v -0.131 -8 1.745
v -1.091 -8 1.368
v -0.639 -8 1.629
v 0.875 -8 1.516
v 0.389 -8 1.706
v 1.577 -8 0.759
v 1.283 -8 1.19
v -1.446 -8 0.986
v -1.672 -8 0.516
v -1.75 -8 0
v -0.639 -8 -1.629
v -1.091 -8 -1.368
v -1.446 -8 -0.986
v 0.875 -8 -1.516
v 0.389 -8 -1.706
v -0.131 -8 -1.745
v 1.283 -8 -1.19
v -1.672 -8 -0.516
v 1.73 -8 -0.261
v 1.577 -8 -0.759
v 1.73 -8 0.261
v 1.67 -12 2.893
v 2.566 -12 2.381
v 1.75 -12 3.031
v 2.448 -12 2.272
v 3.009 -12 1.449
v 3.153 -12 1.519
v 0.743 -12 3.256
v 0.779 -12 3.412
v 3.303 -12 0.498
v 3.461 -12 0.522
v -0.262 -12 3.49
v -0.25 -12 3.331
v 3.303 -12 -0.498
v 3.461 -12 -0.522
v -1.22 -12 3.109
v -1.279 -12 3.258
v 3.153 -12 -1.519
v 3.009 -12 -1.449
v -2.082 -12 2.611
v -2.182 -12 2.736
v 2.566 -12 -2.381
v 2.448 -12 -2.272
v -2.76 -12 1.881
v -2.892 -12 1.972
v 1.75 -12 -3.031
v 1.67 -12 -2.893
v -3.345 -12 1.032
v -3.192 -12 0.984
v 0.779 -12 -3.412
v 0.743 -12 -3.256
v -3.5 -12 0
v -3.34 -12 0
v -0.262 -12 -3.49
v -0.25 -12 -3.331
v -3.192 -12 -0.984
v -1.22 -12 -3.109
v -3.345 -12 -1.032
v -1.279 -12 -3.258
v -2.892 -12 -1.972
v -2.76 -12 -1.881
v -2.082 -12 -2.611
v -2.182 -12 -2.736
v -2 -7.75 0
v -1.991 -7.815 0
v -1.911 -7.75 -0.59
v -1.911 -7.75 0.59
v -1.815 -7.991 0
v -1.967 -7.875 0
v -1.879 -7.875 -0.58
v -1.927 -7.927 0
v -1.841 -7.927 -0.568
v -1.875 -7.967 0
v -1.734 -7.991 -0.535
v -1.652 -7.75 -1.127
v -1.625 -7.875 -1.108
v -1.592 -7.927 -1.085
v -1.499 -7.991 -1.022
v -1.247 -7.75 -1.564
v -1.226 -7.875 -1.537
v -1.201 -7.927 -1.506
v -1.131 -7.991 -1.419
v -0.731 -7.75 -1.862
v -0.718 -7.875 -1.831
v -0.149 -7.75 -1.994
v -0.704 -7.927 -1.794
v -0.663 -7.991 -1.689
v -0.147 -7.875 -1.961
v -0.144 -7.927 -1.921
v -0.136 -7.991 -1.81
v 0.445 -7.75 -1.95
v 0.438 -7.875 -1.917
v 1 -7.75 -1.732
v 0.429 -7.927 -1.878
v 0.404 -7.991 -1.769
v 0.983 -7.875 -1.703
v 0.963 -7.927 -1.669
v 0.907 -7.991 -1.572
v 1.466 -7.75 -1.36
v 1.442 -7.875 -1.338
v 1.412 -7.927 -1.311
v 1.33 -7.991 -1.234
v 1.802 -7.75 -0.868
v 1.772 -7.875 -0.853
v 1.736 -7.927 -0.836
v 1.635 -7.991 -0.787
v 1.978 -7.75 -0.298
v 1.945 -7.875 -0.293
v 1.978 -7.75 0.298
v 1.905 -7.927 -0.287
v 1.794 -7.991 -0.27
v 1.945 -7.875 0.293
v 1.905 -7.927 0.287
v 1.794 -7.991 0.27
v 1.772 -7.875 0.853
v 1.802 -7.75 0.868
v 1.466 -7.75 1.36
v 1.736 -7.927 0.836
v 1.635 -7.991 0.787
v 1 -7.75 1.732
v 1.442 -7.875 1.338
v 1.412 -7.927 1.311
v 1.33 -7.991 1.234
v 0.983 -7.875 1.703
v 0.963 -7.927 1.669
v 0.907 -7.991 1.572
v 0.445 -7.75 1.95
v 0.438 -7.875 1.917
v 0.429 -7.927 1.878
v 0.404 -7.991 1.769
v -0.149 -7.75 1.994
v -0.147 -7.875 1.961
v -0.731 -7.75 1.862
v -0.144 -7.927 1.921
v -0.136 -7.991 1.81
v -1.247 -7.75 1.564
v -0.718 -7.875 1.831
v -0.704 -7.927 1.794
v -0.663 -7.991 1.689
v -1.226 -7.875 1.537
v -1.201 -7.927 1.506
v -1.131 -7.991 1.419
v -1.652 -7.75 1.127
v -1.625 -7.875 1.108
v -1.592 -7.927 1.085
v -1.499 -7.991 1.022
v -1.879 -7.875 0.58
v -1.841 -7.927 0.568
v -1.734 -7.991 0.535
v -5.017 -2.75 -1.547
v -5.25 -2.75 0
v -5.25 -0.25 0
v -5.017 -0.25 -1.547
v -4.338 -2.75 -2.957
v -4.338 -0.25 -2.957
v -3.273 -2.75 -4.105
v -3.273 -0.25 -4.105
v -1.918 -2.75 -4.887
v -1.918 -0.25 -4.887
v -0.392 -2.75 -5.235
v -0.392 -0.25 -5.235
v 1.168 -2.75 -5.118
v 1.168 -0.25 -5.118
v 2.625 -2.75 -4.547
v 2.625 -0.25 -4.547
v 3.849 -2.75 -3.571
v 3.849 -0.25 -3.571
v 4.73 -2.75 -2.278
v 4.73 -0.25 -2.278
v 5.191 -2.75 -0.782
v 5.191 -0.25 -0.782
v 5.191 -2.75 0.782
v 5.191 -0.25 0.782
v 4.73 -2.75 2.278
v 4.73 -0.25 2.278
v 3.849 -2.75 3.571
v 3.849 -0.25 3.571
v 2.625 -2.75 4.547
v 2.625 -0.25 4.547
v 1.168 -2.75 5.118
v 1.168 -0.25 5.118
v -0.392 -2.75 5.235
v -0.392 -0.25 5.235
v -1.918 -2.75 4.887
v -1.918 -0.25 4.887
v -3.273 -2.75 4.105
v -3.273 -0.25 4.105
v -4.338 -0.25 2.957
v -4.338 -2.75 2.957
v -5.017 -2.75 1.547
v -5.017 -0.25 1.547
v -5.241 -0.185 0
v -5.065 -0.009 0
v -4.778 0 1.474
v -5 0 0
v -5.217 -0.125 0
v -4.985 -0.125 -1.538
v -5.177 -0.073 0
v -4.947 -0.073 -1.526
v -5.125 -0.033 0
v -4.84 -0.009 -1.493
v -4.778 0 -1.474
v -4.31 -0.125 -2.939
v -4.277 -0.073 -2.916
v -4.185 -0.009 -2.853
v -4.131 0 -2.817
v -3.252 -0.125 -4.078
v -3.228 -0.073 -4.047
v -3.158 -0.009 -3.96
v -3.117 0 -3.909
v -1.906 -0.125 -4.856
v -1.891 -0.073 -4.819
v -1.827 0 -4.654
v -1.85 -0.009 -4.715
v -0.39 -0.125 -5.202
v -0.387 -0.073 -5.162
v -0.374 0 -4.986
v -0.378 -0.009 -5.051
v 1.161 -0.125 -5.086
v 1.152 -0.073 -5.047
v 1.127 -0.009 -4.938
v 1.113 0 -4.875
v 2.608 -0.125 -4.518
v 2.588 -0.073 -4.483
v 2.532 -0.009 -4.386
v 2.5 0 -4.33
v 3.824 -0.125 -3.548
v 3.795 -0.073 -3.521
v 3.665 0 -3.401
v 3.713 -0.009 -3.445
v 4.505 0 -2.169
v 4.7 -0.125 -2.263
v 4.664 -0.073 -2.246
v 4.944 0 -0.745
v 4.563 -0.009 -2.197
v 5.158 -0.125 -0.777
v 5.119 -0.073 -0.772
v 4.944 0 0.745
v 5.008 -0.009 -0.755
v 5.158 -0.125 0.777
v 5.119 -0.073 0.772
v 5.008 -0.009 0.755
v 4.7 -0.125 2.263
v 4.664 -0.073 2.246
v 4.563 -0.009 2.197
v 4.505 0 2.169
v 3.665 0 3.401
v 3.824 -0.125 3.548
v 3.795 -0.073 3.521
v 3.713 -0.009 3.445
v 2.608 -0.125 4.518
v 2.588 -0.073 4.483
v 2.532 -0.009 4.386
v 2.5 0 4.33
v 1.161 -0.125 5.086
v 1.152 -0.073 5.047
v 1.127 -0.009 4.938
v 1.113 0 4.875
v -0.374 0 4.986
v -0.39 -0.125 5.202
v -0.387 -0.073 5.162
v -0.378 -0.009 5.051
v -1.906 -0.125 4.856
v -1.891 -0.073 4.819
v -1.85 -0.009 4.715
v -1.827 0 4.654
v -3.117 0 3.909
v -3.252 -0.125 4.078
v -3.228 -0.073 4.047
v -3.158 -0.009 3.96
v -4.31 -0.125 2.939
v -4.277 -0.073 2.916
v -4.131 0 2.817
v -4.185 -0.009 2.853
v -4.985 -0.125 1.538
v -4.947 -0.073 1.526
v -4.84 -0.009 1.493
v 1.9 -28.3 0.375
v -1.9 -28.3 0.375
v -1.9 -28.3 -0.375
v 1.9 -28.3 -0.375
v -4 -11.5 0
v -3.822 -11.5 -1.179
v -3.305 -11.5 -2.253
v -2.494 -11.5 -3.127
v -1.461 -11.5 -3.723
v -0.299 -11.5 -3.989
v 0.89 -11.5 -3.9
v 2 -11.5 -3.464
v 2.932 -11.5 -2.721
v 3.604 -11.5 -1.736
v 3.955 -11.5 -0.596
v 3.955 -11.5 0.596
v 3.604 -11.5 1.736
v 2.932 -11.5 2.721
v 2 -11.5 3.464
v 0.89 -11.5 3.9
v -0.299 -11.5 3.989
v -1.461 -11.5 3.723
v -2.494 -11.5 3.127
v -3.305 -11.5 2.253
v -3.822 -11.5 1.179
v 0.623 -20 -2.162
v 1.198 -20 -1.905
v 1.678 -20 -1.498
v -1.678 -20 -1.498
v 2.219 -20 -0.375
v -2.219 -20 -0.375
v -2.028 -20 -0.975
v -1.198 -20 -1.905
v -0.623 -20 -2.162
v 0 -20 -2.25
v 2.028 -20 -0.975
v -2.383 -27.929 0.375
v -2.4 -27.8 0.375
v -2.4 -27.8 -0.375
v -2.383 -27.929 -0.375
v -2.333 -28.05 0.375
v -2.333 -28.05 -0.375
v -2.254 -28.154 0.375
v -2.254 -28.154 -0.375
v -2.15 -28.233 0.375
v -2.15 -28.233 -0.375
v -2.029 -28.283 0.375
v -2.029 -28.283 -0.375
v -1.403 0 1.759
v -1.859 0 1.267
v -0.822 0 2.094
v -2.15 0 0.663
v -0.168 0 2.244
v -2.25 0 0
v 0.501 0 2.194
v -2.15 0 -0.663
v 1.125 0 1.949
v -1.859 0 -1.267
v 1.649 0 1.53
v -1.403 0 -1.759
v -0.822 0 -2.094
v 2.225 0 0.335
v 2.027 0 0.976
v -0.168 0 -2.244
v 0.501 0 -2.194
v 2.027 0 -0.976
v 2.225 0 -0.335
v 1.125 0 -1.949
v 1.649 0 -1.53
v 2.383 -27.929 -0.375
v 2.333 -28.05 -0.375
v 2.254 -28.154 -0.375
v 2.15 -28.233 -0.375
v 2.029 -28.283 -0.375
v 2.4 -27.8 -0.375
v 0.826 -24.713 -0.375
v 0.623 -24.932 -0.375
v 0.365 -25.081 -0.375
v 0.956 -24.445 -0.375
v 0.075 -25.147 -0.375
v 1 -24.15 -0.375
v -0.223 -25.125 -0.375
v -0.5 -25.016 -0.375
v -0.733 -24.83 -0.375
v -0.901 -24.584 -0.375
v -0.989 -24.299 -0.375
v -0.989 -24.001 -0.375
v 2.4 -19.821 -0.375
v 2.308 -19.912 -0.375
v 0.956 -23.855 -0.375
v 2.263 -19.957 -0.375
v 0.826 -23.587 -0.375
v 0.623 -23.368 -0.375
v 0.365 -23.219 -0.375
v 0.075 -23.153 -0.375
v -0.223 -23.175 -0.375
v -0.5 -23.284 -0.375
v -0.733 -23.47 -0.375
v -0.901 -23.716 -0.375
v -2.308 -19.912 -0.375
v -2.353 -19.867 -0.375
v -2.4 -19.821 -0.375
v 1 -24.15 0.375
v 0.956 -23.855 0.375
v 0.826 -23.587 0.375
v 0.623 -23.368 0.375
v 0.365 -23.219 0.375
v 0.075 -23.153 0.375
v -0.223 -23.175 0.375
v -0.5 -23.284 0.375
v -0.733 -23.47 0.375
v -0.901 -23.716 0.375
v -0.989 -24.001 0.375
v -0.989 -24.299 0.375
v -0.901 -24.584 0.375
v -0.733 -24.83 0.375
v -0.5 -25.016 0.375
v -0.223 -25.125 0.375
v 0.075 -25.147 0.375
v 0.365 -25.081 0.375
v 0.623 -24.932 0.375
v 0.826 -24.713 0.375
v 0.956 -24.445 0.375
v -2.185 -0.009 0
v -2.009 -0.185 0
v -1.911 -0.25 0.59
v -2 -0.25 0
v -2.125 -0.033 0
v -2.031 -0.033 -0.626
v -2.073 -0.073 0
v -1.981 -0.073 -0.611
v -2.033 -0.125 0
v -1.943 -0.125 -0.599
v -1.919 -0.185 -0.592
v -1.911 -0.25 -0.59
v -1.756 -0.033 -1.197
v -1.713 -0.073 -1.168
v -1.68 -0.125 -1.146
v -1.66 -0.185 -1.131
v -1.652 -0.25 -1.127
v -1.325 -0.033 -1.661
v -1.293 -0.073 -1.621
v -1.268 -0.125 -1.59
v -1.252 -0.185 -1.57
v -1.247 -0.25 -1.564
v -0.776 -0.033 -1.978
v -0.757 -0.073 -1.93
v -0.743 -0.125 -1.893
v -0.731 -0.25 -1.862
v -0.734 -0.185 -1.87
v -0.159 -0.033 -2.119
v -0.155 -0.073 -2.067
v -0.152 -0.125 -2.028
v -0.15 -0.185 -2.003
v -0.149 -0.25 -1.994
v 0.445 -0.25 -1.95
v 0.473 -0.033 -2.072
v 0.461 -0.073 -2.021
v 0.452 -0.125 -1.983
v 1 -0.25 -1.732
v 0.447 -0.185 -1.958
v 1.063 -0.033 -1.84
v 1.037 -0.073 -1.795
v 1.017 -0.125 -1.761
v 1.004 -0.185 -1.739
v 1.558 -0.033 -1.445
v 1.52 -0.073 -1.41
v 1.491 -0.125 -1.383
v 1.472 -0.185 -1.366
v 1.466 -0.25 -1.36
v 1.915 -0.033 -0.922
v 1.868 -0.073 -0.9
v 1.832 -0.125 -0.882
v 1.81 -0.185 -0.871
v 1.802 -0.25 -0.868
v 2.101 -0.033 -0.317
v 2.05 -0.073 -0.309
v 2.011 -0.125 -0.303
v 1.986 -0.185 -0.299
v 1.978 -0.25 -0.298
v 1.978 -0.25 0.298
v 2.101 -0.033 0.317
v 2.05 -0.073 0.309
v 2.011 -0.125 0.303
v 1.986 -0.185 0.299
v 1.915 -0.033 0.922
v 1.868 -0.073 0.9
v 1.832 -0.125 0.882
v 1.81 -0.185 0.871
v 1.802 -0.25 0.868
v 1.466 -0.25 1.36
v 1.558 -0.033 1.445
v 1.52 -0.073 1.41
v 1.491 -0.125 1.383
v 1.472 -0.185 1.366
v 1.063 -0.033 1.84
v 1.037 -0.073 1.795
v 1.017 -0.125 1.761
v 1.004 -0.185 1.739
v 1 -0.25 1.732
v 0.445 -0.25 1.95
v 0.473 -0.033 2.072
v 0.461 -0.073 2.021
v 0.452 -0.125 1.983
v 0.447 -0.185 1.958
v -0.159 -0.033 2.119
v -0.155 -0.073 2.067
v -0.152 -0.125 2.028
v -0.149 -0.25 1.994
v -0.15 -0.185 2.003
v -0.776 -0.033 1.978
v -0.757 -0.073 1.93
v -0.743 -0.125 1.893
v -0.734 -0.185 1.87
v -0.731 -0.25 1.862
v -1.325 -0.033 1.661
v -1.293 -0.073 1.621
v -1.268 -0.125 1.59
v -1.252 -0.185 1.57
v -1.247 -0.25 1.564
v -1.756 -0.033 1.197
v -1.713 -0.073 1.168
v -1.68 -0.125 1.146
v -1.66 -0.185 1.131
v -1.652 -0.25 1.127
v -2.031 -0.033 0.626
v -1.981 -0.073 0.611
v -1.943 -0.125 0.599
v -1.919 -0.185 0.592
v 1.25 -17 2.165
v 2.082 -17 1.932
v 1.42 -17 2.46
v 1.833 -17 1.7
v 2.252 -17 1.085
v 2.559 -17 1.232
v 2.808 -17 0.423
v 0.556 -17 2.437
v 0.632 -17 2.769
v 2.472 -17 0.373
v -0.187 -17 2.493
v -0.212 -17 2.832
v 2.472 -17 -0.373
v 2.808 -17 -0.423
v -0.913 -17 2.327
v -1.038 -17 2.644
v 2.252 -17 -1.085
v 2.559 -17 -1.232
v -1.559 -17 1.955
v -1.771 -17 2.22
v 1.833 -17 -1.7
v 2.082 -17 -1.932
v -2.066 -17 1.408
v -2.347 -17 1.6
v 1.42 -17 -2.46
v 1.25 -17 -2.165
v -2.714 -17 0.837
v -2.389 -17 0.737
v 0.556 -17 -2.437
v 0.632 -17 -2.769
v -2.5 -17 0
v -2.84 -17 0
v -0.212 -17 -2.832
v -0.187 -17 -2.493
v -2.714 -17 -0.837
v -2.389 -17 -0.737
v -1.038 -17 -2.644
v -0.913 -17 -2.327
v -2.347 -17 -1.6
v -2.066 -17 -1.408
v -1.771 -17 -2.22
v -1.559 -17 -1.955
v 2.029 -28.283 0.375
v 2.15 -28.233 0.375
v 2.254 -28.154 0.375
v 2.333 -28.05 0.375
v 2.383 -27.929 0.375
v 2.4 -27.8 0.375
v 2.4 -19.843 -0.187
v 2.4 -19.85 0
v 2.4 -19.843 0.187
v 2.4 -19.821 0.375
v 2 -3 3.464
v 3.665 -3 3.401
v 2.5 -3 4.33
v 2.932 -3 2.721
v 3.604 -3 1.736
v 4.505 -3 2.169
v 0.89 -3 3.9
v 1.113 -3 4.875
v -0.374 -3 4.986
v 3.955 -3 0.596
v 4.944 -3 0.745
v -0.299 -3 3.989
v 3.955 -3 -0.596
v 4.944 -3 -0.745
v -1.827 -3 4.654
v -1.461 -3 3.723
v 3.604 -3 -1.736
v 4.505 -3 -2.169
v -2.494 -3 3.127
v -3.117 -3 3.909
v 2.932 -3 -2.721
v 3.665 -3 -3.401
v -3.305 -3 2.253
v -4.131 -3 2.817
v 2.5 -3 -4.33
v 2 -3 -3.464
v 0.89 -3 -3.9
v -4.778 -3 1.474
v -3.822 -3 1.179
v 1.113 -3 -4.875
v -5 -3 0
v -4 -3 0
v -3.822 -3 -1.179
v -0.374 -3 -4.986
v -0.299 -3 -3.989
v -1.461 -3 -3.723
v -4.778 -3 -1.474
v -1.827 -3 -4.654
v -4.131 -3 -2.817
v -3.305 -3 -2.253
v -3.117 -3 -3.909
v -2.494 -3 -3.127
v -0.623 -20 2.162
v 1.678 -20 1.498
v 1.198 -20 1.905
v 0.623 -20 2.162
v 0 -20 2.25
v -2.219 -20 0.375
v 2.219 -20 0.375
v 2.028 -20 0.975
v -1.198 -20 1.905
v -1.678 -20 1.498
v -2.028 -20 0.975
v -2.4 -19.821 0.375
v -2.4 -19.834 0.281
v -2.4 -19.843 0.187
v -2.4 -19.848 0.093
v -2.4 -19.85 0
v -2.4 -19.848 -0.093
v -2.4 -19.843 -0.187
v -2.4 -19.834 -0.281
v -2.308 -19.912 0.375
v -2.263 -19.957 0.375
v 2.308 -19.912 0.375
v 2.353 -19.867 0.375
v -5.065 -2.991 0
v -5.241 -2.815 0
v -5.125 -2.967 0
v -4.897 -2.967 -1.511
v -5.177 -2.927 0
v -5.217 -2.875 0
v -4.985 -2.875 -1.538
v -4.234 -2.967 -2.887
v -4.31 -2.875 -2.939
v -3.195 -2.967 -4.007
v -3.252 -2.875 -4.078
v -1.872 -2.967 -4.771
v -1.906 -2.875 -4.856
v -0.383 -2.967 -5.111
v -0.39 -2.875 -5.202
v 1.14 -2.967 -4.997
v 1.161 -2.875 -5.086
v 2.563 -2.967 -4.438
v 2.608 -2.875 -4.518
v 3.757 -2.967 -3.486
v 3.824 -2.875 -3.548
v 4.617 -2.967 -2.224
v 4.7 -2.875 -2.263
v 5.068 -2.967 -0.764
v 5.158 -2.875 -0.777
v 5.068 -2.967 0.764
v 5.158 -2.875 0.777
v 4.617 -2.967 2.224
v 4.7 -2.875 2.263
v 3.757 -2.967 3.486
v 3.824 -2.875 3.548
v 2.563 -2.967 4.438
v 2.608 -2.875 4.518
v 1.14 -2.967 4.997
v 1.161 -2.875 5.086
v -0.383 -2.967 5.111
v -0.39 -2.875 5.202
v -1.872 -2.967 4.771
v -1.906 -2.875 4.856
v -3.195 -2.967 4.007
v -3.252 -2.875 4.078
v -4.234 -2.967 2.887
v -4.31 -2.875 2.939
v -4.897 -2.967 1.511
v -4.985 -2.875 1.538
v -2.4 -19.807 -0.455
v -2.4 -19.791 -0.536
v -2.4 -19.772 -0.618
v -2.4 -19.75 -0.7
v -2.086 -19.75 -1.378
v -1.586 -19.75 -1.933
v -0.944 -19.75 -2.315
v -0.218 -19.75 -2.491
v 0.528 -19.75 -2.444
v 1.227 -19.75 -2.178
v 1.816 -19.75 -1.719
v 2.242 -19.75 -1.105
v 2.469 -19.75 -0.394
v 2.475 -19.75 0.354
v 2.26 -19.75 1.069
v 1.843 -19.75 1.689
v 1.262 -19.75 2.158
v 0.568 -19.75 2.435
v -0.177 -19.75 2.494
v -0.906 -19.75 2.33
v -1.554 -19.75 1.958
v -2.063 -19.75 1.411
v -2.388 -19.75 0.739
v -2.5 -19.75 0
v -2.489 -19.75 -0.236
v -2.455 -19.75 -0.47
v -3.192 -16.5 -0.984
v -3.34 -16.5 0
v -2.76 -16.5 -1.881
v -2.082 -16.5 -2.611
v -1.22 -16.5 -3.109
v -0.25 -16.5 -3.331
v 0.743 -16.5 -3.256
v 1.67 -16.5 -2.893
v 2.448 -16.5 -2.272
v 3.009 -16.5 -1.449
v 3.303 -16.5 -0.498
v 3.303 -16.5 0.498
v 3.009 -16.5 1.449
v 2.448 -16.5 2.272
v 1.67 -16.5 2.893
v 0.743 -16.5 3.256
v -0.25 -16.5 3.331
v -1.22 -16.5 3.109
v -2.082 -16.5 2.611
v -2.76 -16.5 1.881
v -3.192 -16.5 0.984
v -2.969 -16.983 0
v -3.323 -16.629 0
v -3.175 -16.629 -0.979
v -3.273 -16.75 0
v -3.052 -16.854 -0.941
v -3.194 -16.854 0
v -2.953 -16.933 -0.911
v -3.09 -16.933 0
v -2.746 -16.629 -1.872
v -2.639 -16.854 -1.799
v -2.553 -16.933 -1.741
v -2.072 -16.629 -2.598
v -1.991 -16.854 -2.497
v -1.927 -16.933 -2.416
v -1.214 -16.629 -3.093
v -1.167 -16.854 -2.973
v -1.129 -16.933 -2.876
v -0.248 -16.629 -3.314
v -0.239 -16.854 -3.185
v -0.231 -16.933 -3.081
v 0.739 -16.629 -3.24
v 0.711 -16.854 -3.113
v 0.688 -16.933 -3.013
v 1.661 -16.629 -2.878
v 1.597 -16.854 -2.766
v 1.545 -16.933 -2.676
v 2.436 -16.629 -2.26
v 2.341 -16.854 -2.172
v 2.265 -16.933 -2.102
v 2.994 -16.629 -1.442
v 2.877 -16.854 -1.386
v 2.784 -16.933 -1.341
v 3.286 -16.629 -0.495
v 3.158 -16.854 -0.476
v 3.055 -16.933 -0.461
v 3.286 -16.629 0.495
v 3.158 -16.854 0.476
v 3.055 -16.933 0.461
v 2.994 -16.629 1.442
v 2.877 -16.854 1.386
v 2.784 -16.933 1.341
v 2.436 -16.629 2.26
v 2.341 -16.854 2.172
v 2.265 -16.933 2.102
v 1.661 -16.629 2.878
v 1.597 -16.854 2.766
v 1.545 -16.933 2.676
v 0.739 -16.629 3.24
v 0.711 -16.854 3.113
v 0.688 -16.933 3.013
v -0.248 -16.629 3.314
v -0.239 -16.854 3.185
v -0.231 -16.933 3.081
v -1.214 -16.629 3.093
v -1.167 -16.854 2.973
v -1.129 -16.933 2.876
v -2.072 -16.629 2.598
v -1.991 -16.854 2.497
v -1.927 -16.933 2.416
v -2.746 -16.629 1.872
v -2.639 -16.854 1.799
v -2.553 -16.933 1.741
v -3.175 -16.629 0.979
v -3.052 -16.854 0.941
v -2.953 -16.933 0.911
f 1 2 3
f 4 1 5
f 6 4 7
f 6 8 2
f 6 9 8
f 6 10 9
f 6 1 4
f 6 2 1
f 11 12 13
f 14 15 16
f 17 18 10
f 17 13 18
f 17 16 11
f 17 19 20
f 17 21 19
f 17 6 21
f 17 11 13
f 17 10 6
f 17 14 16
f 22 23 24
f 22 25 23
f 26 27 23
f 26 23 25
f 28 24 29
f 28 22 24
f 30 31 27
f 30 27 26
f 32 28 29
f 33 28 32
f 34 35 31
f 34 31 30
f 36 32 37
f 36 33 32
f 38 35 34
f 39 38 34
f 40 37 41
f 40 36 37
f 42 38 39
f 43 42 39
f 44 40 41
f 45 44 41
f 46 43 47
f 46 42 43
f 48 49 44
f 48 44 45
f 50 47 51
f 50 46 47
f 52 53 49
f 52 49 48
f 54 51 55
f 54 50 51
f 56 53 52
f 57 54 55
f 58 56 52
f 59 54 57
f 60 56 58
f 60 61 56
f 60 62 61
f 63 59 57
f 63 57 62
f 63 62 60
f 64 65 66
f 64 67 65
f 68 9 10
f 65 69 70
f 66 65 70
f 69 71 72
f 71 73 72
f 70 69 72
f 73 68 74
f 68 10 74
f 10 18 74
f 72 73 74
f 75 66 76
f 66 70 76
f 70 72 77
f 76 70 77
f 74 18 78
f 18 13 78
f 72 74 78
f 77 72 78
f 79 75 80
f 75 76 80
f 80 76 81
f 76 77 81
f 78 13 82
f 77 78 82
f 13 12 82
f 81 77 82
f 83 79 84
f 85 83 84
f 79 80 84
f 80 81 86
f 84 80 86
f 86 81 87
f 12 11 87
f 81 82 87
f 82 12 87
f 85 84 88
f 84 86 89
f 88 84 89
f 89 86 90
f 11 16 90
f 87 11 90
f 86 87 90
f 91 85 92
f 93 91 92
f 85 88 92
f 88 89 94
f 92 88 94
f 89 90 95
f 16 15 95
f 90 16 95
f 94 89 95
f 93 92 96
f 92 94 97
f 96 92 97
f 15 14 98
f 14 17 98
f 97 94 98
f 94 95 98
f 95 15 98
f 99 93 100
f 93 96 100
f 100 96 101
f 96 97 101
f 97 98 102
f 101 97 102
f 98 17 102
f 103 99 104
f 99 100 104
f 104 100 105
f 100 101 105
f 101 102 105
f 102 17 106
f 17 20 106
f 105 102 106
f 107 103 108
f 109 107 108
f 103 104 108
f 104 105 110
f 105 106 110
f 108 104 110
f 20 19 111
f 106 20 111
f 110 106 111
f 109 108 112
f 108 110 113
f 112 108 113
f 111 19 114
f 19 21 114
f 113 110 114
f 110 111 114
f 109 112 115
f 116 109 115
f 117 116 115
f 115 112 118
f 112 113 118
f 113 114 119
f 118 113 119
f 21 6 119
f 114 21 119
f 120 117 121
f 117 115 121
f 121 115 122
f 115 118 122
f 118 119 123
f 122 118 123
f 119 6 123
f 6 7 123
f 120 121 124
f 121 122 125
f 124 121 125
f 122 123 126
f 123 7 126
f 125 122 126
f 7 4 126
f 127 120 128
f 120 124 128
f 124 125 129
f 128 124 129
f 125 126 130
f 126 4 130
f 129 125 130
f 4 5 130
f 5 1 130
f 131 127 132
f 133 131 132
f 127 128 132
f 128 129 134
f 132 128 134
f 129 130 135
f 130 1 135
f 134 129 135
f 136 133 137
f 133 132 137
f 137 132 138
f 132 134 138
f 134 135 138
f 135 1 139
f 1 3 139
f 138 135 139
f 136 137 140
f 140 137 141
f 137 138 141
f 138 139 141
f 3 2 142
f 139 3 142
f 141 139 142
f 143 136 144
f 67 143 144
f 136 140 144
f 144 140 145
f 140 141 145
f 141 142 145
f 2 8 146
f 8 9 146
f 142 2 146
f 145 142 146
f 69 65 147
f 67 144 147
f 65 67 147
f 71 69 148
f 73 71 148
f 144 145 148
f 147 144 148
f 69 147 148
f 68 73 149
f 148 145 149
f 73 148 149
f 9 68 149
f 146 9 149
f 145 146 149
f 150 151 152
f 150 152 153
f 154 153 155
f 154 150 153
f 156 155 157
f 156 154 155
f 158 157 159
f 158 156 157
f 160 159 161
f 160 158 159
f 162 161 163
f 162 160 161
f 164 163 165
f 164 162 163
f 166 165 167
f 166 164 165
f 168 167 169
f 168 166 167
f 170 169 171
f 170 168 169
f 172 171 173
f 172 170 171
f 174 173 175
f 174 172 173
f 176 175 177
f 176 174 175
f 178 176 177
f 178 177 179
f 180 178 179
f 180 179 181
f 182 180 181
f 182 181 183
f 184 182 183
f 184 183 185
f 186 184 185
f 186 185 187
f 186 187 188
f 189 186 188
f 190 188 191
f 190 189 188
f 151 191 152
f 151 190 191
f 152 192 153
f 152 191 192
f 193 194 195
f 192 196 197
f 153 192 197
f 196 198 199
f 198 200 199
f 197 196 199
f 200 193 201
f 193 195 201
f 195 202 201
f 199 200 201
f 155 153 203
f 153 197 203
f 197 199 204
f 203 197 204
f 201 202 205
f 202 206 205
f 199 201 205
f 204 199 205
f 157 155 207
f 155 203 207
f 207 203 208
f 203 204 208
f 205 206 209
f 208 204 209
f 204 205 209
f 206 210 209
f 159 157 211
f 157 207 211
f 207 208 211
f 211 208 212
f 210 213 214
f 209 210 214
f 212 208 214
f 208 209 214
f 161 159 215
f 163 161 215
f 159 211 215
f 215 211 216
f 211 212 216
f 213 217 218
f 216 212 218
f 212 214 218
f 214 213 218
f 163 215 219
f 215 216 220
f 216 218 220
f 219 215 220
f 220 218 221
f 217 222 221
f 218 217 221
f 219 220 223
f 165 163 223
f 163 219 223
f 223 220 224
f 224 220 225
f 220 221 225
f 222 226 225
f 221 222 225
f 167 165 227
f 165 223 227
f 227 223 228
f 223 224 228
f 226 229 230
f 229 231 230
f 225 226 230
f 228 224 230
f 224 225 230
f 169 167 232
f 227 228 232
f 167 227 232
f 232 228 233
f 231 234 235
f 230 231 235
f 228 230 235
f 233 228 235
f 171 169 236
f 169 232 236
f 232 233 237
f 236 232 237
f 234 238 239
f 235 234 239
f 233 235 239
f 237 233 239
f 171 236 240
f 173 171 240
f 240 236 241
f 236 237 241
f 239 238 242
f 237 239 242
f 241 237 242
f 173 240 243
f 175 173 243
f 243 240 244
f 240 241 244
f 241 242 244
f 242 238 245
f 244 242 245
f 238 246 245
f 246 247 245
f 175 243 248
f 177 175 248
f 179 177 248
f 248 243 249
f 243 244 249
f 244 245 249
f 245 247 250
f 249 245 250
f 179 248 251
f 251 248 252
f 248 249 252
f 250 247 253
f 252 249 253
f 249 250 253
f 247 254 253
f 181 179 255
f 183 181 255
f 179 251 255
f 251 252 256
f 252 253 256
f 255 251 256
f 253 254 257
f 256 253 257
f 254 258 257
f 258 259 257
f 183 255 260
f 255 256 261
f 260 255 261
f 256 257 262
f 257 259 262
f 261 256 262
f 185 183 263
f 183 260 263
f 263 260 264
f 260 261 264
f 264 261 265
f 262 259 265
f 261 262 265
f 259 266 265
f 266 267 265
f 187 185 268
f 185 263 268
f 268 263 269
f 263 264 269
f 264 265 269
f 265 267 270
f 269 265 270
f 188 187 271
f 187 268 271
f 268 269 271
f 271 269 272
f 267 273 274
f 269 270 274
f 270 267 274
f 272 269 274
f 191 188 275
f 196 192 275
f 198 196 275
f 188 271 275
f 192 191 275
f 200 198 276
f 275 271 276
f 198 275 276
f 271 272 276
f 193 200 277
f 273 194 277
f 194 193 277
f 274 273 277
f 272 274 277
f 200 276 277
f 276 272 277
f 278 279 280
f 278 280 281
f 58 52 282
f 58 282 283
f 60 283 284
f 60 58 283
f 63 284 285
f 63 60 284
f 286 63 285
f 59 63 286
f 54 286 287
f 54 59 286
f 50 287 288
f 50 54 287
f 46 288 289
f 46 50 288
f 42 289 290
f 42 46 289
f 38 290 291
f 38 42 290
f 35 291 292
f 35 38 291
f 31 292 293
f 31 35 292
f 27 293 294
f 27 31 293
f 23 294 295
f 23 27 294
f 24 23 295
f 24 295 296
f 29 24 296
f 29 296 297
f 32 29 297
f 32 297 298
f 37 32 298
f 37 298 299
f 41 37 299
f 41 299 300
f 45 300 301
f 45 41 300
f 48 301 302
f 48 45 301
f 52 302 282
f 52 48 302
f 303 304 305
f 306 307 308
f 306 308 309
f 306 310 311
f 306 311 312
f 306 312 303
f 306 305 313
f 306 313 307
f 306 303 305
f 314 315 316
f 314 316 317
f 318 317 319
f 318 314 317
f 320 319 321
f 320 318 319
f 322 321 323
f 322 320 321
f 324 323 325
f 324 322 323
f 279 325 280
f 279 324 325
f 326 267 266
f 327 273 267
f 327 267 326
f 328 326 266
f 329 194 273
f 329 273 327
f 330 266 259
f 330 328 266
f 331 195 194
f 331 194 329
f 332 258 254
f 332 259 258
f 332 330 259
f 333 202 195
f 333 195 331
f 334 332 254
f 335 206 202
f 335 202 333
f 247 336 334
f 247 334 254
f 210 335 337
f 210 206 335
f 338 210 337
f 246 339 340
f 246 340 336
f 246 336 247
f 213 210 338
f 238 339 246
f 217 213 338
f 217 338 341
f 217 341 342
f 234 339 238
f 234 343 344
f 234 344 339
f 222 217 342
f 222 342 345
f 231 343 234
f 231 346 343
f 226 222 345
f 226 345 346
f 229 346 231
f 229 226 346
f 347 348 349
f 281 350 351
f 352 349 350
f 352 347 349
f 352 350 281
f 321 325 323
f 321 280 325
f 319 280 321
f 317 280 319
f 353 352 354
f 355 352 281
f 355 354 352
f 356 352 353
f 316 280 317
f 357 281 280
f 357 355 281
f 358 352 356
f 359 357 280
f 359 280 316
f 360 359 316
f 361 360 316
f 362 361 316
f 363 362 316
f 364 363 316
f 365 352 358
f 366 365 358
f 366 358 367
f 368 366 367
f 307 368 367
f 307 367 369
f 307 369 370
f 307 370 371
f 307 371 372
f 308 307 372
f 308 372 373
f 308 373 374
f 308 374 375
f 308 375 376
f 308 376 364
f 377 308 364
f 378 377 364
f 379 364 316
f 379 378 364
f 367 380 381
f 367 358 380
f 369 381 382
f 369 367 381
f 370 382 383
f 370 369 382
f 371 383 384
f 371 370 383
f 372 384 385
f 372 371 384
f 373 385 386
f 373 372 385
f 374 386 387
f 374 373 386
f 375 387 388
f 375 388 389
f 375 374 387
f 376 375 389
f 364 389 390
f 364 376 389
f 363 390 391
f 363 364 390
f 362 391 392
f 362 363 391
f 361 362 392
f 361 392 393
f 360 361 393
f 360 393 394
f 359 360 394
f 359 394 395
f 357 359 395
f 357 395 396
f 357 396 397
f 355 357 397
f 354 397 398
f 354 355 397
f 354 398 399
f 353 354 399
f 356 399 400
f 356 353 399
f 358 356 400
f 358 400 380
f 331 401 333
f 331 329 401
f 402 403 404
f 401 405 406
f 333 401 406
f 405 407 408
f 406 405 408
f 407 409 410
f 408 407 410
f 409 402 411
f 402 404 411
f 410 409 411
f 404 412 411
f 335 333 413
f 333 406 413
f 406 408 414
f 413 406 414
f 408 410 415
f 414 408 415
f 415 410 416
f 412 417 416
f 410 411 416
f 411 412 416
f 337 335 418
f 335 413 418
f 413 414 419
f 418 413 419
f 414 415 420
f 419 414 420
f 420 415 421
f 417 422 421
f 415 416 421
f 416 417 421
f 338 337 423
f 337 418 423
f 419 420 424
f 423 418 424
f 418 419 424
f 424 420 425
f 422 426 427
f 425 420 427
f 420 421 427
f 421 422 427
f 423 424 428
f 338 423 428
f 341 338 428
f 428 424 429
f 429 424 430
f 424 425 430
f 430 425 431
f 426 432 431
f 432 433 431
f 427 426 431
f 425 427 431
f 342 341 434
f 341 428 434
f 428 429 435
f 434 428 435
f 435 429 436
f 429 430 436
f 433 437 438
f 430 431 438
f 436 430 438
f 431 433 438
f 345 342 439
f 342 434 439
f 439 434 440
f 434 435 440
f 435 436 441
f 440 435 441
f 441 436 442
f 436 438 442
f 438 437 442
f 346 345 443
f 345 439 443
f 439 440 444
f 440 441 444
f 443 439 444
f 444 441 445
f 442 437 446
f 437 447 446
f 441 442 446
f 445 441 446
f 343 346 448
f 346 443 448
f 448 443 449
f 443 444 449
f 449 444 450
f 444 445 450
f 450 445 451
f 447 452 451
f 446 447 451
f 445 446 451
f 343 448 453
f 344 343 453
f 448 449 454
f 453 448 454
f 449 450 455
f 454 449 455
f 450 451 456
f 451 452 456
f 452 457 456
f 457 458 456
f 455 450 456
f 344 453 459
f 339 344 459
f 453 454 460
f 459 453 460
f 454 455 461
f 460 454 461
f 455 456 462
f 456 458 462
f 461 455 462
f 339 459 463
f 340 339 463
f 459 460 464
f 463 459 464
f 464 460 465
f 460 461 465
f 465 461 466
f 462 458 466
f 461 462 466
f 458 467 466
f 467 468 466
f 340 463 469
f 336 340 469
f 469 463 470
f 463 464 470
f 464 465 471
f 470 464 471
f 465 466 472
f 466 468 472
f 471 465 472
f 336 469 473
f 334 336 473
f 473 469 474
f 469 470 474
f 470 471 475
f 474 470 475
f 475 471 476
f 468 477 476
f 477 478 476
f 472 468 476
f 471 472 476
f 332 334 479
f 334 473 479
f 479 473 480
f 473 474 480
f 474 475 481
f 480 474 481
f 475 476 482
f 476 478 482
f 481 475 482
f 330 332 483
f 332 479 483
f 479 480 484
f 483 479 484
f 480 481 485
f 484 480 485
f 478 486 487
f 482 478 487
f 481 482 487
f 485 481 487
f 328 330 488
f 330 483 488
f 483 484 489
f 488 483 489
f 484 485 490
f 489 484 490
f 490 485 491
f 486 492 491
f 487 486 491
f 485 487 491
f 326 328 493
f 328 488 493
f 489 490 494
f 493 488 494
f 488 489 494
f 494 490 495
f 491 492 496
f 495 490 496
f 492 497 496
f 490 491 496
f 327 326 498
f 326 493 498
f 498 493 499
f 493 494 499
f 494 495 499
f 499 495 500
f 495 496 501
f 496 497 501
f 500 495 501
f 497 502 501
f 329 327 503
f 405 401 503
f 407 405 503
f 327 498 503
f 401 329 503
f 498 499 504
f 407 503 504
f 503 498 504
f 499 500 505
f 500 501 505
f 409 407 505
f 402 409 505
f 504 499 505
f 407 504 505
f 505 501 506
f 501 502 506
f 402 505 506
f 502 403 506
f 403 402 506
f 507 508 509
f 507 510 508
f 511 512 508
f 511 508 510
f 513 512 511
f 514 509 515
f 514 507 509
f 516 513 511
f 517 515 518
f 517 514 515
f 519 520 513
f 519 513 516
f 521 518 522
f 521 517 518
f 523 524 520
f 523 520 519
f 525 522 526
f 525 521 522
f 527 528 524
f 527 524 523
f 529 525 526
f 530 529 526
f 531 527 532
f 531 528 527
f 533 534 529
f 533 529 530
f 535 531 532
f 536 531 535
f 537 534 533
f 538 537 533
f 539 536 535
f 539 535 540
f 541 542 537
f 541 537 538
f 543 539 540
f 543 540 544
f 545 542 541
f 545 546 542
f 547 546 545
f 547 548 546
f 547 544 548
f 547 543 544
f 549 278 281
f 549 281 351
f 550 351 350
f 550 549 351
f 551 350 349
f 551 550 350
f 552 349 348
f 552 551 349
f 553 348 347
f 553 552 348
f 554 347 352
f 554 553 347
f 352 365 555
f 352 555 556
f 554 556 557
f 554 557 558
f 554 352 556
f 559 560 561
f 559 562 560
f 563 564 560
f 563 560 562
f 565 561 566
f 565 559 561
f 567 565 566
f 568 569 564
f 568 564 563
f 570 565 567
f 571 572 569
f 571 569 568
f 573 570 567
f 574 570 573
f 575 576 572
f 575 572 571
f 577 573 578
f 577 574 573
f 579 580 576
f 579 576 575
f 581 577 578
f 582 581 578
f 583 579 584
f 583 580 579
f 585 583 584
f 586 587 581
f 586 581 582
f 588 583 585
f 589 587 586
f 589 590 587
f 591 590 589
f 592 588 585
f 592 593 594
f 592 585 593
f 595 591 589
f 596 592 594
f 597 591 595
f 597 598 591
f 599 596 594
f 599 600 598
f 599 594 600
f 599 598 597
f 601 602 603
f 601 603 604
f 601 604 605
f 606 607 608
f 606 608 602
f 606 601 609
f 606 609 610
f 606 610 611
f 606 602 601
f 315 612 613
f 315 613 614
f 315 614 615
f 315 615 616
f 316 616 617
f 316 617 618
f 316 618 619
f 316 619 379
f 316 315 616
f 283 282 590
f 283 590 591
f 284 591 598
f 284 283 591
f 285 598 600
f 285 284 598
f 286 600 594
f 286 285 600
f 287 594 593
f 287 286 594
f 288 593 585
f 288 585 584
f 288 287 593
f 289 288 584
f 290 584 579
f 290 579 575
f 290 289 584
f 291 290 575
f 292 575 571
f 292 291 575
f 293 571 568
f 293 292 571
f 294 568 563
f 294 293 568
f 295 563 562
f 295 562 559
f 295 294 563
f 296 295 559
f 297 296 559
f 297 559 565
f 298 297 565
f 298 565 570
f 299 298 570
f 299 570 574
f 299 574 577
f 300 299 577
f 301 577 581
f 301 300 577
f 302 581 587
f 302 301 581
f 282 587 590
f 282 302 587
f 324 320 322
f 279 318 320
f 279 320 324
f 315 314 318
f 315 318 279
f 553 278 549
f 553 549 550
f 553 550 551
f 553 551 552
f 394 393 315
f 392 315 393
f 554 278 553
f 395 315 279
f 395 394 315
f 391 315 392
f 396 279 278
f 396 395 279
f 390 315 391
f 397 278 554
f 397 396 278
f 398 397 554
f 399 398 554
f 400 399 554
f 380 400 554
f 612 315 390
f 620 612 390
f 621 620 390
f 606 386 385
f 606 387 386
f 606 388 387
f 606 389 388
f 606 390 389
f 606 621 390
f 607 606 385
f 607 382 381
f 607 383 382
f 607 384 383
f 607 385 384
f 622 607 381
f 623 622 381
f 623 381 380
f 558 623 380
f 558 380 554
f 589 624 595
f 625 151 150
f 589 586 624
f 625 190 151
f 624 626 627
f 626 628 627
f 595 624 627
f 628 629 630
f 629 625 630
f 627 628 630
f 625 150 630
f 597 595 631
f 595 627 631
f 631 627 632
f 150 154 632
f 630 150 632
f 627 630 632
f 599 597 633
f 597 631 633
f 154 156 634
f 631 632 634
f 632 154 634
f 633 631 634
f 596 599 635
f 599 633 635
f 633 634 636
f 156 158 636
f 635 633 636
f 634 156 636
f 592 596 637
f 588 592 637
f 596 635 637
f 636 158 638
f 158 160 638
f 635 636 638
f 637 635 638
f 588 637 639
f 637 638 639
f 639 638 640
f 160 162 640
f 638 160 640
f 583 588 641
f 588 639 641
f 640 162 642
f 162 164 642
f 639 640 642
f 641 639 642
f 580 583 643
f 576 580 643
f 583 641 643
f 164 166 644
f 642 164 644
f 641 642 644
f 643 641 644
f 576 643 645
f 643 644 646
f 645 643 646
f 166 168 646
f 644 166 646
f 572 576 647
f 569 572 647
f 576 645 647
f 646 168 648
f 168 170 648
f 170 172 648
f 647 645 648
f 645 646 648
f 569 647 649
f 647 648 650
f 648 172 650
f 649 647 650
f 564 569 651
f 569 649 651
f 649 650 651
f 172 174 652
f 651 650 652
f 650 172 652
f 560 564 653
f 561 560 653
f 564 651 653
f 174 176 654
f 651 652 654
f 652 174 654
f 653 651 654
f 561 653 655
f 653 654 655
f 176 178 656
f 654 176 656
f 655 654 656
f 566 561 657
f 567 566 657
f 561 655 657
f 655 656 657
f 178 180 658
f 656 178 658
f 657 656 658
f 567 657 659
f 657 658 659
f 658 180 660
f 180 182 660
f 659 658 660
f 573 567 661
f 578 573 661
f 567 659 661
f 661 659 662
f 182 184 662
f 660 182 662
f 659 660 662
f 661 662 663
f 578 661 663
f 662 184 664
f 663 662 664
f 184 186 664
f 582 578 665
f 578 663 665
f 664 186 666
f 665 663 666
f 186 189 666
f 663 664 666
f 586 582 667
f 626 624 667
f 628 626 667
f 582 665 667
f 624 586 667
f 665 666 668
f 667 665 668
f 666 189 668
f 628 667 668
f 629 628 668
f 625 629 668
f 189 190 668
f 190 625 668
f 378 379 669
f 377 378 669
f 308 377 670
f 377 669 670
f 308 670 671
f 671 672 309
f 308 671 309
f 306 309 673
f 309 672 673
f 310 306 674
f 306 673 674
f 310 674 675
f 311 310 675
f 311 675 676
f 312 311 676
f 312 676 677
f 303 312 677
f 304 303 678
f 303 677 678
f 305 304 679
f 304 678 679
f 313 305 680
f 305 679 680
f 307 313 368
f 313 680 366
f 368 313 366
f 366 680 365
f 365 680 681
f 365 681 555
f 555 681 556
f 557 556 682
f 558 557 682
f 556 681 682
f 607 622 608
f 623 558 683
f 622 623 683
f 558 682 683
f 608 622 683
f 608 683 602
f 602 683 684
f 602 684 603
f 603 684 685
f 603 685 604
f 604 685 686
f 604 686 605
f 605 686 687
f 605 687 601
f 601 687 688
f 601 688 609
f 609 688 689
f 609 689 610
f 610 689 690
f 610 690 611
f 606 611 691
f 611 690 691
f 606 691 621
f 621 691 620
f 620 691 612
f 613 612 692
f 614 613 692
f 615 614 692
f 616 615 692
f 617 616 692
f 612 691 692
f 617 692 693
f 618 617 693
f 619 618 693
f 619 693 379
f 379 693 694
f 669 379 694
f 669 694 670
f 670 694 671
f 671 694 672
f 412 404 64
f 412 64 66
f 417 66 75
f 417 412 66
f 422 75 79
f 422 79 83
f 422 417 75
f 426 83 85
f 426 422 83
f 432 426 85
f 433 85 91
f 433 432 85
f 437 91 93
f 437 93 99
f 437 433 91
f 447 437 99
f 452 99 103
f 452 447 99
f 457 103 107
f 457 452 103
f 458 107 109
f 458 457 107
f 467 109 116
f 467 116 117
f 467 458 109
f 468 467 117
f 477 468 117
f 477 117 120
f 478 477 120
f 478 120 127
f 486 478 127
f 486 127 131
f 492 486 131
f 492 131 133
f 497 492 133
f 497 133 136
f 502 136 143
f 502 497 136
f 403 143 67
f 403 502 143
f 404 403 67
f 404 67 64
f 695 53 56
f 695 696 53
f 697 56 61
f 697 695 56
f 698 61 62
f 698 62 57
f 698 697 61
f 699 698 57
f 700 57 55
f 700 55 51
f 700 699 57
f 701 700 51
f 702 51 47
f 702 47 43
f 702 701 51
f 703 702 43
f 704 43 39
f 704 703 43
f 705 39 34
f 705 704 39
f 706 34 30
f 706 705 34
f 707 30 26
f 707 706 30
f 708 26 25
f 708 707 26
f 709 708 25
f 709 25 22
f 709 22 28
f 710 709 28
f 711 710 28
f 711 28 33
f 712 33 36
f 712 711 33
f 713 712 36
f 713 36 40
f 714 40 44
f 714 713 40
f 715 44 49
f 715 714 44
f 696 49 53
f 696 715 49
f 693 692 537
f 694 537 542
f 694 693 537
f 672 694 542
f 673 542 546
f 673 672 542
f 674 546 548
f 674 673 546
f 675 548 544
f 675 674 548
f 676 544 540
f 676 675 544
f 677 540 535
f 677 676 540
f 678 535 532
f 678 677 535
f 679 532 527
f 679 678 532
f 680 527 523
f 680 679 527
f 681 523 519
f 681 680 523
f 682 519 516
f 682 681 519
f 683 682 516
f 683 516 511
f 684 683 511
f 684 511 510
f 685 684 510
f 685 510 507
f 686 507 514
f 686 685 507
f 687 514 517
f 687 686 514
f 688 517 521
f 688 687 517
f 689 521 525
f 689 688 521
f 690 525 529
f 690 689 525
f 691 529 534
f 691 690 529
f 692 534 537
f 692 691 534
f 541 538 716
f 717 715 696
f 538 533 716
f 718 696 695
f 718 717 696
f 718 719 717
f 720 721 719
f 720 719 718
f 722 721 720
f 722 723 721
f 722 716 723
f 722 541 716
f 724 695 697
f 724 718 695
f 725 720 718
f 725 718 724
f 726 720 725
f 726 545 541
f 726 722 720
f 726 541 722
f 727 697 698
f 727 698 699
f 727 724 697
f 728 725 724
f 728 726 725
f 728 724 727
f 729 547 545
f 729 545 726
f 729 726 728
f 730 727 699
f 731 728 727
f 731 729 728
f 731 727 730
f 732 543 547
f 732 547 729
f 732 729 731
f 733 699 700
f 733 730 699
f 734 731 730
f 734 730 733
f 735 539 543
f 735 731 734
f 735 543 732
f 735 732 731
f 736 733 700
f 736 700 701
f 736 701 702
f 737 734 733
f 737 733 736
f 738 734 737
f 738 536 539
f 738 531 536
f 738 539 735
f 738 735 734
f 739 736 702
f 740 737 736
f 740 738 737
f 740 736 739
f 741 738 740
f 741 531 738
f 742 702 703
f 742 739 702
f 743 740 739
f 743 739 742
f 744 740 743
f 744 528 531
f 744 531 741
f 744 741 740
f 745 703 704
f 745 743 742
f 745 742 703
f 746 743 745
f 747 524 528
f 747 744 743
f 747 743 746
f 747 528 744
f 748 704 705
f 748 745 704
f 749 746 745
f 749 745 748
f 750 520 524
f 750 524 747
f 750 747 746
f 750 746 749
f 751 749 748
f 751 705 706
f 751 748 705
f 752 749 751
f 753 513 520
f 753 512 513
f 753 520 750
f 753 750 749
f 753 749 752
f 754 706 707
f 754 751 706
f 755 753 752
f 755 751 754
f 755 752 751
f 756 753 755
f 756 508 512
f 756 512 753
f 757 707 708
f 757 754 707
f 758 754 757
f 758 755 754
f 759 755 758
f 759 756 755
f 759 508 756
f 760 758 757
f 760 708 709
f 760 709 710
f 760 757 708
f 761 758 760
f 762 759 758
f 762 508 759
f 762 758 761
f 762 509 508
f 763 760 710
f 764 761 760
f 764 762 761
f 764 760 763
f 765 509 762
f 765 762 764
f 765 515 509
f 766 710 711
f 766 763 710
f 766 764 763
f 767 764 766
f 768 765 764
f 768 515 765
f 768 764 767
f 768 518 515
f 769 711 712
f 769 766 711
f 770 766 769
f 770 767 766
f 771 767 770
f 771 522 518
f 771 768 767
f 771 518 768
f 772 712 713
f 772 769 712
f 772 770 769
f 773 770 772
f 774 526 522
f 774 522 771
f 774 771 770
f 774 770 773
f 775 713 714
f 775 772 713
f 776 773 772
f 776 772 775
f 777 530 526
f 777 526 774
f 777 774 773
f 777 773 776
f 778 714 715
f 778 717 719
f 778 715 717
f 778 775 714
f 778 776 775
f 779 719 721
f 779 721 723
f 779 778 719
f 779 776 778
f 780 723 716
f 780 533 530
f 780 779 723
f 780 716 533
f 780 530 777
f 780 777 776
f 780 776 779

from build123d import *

# Parameters (mm, degrees)
SKETCH2_R           = 1
BOSS_EXTRUDE1_DEPTH = 0.375
CHAMFER1_SIZE       = 0.25
CHAMFER2_SIZE       = 0.5
FILLET1_R           = 0.25


with BuildPart() as part:
    # Sketch1 → Revolve1 (revolve)
    with BuildSketch(Plane.XY):
        with BuildLine():
            Line((-2, 0), (-5.25, 0))
            Line((-5.25, 0), (-5.25, -3))
            Line((-5.25, -3), (-4, -3))
            Line((-4, -3), (-4, -12))
            Line((-4, -12), (-3.34, -12))
            Line((-3.34, -12), (-3.34, -16.5))
            ThreePointArc((-3.34, -16.5), (-3.193553391, -16.853553391), (-2.84, -17))
            Line((-2.84, -17), (-2.5, -17))
            Line((-2.5, -17), (-2.5, -20))
            Line((-2.5, -20), (0, -20))
            Line((0, -20), (0, -8))
            Line((0, -8), (-2, -8))
            Line((-2, -8), (-2, 0))
        make_face()
    revolve(axis=Axis((0, -20, 0), (0, -1, 0)))

    # Sketch2 → Boss-Extrude1 (add, symmetric)
    with BuildSketch(Plane.XY):
        with BuildLine():
            Line((-2.4, -20), (-2.4, -27.8))
            ThreePointArc((-2.4, -27.8), (-2.253553391, -28.153553391), (-1.9, -28.3))
            Line((-1.9, -28.3), (1.9, -28.3))
            ThreePointArc((1.9, -28.3), (2.253553391, -28.153553391), (2.4, -27.8))
            Line((2.4, -27.8), (2.4, -20))
            Line((2.4, -20), (-2.4, -20))
        make_face()
        with Locations((0, -24.15)):
            Circle(SKETCH2_R, mode=Mode.SUBTRACT)
    extrude(amount=BOSS_EXTRUDE1_DEPTH, both=True)

    # Chamfer1
    # the kernel refuses this chamfer: 0.25 mm, written as the material it takes off along each edge
    with BuildSketch(Plane(origin=(0, -20, 0), x_dir=(-1, 0, 0), z_dir=(0, 0, 1))) as chamfer1_piece_1_section:
        Polygon((2.5 - CHAMFER1_SIZE, 0), (2.5, -CHAMFER1_SIZE), (2.5, 0), align=None)
    chamfer1_piece_1 = revolve(axis=Axis((0, -20, 0), (0, -1, 0)), mode=Mode.PRIVATE)
    chamfer1_piece_1 = split(chamfer1_piece_1, bisect_by=Plane(origin=(-2.4, -19.896022541, 0), z_dir=(-1, 0, 0)), keep=Keep.TOP, mode=Mode.PRIVATE)
    add(chamfer1_piece_1, mode=Mode.SUBTRACT)
    with BuildSketch(Plane(origin=(0, -20, 0), x_dir=(-1, 0, 0), z_dir=(0, 0, 1))) as chamfer1_piece_2_section:
        Polygon((2.5 - CHAMFER1_SIZE, 0), (2.5, -CHAMFER1_SIZE), (2.5, 0), align=None)
    chamfer1_piece_2 = revolve(axis=Axis((0, -20, 0), (0, -1, 0)), mode=Mode.PRIVATE)
    chamfer1_piece_2 = split(chamfer1_piece_2, bisect_by=Plane(origin=(-7e-09, -19.879189064, -0.375), z_dir=(0, 0, -1)), keep=Keep.TOP, mode=Mode.PRIVATE)
    add(chamfer1_piece_2, mode=Mode.SUBTRACT)
    with BuildSketch(Plane(origin=(0, -20, 0), x_dir=(-1, 0, 0), z_dir=(0, 0, 1))) as chamfer1_piece_3_section:
        Polygon((2.5 - CHAMFER1_SIZE, 0), (2.5, -CHAMFER1_SIZE), (2.5, 0), align=None)
    chamfer1_piece_3 = revolve(axis=Axis((0, -20, 0), (0, -1, 0)), mode=Mode.PRIVATE)
    chamfer1_piece_3 = split(chamfer1_piece_3, bisect_by=Plane(origin=(-7e-09, -19.879189064, 0.375), z_dir=(0, 0, 1)), keep=Keep.TOP, mode=Mode.PRIVATE)
    add(chamfer1_piece_3, mode=Mode.SUBTRACT)
    with BuildSketch(Plane(origin=(0, -20, 0), x_dir=(-1, 0, 0), z_dir=(0, 0, 1))) as chamfer1_piece_4_section:
        Polygon((2.5 - CHAMFER1_SIZE, 0), (2.5, -CHAMFER1_SIZE), (2.5, 0), align=None)
    chamfer1_piece_4 = revolve(axis=Axis((0, -20, 0), (0, -1, 0)), mode=Mode.PRIVATE)
    chamfer1_piece_4 = split(chamfer1_piece_4, bisect_by=Plane(origin=(2.4, -19.896022542, 0), z_dir=(1, 0, 0)), keep=Keep.TOP, mode=Mode.PRIVATE)
    add(chamfer1_piece_4, mode=Mode.SUBTRACT)

    # Chamfer2
    chamfer2_edges = [part.edges().sort_by_distance(p)[0] for p in [
        (4, -12, 0),
    ]]
    chamfer(chamfer2_edges, length=CHAMFER2_SIZE)

    # Fillet1
    fillet1_edges = [part.edges().sort_by_distance(p)[0] for p in [
        (2, -8, 0),
        (5.25, -3, 0),
        (5.25, 0, 0),
        (2, 0, 0),
    ]]
    fillet(fillet1_edges, radius=FILLET1_R)


solid = part.part
